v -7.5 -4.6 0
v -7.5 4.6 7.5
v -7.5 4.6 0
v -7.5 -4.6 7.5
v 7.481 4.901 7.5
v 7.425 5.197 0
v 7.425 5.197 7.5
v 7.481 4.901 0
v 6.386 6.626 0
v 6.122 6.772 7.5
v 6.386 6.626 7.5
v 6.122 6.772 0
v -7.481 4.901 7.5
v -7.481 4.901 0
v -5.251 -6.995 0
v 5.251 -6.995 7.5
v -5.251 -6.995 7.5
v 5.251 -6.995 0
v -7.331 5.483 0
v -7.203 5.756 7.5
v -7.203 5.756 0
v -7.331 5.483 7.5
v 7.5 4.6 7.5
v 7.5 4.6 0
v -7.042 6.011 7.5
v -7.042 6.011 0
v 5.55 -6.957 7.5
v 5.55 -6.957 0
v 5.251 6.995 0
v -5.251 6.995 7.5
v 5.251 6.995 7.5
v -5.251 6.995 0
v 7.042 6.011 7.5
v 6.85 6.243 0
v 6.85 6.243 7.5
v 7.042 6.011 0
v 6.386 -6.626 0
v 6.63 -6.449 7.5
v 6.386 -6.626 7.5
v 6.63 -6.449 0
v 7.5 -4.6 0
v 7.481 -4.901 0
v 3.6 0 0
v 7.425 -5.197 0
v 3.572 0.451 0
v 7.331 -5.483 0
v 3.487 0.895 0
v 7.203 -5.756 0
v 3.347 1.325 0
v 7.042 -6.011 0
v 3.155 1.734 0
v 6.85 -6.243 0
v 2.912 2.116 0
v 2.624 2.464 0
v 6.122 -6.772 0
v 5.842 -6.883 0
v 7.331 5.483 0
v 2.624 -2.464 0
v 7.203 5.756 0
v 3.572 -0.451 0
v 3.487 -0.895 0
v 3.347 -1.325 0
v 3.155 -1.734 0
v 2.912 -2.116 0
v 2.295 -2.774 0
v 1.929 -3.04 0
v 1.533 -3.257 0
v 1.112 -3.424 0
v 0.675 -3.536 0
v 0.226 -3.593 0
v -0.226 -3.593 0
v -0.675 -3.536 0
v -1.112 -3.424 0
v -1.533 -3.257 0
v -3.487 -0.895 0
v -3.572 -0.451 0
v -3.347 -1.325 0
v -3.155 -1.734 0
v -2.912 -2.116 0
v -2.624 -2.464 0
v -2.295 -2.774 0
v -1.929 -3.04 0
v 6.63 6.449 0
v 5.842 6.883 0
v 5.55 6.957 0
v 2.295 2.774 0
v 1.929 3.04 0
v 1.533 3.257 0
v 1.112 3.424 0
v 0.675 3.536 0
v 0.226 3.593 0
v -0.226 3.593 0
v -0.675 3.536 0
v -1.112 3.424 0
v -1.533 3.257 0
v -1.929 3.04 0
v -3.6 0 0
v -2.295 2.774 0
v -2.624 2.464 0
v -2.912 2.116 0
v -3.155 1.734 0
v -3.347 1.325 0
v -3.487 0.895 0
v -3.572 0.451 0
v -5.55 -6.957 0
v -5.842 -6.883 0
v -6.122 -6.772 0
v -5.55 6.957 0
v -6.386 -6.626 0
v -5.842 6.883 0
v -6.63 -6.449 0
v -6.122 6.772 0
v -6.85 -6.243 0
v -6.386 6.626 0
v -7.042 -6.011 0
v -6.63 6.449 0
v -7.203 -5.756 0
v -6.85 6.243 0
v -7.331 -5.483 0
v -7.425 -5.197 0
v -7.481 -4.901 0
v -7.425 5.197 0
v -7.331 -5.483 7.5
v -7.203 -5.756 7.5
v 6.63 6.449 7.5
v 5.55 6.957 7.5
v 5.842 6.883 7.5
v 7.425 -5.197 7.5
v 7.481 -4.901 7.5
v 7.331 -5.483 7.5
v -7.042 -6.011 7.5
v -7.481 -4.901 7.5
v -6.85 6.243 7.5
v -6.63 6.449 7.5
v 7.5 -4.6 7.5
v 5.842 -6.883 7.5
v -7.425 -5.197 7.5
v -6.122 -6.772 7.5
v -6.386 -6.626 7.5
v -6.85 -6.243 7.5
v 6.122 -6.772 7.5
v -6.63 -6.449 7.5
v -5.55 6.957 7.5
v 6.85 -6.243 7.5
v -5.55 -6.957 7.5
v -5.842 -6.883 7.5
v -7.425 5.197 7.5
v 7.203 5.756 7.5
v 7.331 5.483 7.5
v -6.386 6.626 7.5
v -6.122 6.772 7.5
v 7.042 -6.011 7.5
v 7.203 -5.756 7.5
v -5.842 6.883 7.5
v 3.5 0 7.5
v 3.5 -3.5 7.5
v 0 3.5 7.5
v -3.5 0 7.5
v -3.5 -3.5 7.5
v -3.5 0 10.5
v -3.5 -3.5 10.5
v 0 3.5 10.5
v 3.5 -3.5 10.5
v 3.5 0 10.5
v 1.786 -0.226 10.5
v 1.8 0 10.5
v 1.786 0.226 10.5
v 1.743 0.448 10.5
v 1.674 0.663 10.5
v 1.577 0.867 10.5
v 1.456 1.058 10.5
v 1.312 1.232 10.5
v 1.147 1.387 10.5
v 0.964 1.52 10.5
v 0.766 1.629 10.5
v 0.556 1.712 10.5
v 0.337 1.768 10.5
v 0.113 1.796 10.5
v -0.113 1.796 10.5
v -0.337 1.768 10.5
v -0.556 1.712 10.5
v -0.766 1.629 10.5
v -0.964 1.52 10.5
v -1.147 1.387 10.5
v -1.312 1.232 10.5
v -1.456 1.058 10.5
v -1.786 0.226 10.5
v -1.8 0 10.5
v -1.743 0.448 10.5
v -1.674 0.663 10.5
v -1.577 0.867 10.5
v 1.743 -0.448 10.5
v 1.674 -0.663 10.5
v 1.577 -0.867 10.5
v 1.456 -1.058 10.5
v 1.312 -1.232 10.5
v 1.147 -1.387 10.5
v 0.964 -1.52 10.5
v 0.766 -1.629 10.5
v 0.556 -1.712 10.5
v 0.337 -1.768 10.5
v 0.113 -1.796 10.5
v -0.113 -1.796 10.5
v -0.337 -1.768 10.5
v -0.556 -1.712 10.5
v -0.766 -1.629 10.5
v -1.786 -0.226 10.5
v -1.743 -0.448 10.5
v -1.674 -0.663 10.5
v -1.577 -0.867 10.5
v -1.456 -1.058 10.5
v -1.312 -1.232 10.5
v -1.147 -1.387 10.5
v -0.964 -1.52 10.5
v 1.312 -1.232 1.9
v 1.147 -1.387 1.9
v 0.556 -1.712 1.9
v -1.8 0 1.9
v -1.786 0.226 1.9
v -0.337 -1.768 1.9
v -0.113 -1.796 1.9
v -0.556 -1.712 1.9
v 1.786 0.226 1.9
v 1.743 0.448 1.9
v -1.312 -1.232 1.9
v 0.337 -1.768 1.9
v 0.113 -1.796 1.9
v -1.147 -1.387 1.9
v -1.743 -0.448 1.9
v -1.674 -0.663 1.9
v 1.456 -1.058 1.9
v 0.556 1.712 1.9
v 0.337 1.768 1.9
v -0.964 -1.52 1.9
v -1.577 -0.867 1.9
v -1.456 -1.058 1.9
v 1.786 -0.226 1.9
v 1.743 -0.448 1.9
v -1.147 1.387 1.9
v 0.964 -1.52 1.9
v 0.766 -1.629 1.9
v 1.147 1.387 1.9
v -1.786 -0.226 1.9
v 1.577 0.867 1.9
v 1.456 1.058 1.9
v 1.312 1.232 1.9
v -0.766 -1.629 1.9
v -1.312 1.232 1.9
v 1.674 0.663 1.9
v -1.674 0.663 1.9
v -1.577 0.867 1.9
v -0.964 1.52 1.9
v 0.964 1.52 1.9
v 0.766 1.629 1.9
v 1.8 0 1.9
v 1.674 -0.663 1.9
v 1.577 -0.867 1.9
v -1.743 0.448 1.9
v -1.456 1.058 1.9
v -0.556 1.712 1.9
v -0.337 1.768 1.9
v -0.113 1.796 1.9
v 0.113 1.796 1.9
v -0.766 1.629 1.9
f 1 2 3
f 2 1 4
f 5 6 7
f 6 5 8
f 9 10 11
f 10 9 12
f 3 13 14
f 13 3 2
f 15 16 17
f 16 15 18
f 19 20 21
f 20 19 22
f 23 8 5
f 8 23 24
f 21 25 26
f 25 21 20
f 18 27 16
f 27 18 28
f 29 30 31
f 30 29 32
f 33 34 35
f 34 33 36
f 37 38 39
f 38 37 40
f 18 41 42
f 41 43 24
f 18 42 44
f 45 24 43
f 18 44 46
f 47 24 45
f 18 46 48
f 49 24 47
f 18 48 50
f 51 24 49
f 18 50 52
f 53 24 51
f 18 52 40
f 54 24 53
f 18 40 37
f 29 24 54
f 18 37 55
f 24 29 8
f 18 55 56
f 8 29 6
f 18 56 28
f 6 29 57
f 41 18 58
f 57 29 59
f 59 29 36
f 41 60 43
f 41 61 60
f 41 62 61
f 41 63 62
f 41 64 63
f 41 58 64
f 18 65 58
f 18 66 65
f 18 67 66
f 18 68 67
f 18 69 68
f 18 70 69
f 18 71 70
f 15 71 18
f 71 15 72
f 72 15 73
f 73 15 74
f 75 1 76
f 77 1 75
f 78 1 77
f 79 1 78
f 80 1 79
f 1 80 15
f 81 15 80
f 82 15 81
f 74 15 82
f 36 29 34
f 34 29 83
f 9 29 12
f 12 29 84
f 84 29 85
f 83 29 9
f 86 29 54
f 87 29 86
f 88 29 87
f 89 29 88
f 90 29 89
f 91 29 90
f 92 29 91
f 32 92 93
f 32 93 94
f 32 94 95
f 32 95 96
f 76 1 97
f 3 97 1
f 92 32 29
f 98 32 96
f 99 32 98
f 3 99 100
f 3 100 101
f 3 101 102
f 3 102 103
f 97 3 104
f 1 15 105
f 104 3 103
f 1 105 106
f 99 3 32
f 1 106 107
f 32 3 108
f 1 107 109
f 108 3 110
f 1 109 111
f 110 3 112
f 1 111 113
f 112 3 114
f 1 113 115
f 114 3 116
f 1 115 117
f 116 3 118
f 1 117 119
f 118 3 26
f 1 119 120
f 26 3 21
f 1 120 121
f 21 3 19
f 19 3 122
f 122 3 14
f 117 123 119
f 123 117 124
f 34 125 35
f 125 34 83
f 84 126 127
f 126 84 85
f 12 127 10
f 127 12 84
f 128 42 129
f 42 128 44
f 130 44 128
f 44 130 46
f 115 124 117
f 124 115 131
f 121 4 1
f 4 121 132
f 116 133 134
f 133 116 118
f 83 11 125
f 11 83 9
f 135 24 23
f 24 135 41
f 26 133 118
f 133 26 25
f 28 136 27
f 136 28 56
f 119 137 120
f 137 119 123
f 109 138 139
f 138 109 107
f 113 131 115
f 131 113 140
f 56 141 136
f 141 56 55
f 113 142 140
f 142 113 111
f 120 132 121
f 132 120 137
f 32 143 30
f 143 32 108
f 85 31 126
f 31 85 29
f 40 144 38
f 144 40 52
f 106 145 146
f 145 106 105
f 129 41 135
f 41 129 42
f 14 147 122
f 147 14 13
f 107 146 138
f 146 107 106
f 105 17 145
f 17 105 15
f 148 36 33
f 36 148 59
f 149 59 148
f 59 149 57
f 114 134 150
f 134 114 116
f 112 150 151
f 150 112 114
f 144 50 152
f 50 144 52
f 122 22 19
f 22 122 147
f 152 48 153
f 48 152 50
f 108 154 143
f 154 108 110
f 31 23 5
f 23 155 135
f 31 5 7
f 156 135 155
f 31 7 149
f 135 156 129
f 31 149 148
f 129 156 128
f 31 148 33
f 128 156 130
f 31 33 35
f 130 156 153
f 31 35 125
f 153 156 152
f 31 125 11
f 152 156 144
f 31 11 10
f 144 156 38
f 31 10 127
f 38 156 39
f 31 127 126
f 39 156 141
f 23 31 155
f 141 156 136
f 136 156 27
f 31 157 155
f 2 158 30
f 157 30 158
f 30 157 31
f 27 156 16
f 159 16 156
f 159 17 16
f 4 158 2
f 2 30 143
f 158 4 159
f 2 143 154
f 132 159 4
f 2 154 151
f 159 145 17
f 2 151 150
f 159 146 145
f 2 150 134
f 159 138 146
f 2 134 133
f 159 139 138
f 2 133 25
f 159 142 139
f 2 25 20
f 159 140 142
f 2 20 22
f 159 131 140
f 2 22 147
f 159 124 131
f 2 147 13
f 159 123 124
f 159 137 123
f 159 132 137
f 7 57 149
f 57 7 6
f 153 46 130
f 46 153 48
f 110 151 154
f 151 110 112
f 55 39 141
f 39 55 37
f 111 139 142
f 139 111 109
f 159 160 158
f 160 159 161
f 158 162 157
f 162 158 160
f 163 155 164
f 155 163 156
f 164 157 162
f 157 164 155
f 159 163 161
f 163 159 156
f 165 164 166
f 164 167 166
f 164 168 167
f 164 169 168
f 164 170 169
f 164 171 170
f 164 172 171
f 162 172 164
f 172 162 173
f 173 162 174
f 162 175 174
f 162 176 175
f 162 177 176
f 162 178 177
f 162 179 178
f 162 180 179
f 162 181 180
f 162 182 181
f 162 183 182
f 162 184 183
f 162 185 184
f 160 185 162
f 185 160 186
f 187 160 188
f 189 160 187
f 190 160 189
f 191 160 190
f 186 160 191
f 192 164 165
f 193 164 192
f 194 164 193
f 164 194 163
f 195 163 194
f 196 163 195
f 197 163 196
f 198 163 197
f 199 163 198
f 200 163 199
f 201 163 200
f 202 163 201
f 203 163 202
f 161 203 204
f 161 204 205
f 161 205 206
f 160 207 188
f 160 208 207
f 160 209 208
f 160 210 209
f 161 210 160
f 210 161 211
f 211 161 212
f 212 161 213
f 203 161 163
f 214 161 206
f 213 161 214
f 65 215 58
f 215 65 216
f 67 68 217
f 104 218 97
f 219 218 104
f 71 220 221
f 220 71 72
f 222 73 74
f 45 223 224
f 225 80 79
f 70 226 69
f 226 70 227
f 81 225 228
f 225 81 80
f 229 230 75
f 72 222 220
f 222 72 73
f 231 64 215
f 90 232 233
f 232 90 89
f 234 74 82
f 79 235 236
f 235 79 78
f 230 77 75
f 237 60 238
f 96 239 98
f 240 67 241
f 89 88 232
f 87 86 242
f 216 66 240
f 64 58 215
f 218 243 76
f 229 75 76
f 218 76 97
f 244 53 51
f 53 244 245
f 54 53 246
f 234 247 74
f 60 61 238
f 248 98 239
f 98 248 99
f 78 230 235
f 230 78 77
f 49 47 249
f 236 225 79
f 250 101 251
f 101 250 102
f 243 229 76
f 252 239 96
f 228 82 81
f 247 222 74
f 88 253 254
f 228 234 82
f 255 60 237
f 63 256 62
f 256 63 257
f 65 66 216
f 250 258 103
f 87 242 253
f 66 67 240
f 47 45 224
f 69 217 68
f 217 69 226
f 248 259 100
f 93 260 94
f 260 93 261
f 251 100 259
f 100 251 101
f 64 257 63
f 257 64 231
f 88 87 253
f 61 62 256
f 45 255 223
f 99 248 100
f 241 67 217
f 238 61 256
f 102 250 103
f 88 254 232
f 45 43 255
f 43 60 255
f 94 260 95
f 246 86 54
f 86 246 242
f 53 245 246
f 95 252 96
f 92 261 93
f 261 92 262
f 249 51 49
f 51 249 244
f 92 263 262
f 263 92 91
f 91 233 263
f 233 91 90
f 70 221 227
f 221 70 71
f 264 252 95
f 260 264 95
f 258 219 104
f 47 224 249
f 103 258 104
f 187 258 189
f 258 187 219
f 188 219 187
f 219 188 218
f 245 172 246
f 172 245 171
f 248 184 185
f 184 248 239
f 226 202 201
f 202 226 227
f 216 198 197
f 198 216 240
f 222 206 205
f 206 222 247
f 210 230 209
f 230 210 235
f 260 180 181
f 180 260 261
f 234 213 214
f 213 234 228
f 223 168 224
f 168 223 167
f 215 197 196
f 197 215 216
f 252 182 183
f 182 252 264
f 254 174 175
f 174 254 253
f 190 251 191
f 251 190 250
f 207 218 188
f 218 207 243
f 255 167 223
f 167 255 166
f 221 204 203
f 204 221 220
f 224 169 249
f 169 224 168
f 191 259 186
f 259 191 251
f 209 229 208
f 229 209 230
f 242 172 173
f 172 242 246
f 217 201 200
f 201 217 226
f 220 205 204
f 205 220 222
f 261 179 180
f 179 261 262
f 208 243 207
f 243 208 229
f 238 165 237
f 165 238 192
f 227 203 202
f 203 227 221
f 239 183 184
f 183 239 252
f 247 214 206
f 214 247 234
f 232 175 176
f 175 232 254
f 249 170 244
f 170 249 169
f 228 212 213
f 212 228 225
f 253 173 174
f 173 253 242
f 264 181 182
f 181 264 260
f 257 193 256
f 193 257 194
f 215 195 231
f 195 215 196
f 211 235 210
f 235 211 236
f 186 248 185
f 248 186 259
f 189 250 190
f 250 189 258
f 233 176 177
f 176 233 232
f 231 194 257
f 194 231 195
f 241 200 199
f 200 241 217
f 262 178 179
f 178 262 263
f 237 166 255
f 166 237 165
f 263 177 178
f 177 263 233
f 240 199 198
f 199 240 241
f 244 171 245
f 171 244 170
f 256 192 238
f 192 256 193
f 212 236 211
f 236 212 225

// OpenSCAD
$fn = 50;

difference() {
	union() {
		translate(v = [0, 0, 0]) {
			rotate(a = [0, 0, 0]) {
				difference() {
					union() {
						translate(v = [0, 0, 0]) {
							rotate(a = [0, 0, 0]) {
								difference() {
									union() {
										hull() {
											translate(v = [-5.1, 4.6, 0]) {
												cylinder(h = 7.5, r = 2.4);
											}
											translate(v = [5.1, 4.6, 0]) {
												cylinder(h = 7.5, r = 2.4);
											}
											translate(v = [-5.1, -4.6, 0]) {
												cylinder(h = 7.5, r = 2.4);
											}
											translate(v = [5.1, -4.6, 0]) {
												cylinder(h = 7.5, r = 2.4);
											}
										}
										translate(v = [0, -5, 7.4]) {
											linear_extrude(height = 3.1) {
												polygon(points = [[-3.5, 1.5], [3.5, 1.5], [3.5, 5], [0, 8.5], [-3.5, 5]]);
											}
										}
									}
									union() {
										translate(v = [0, 0.0, 0]) {
											rotate(a = [0, 180, 0]) {
												difference() {
													union() {
														translate(v = [0, 0, -16.0]) {
															cylinder(h = 16.0, r = 1.5);
														}
														translate(v = [0, 0, -1.9]) {
															cylinder(h = 1.9, r1 = 1.8, r2 = 3.6);
														}
														cylinder(h = 250, r = 3.6);
														translate(v = [0, 0, -16.0]) {
															cylinder(h = 16.0, r = 1.8);
														}
														translate(v = [0, 0, -16.0]) {
															cylinder(h = 16.0, r = 1.5);
														}
													}
													union();
												}
											}
										}
									}
								}
							}
						}
					}
					union();
				}
			}
		}
	}
	union();
}
